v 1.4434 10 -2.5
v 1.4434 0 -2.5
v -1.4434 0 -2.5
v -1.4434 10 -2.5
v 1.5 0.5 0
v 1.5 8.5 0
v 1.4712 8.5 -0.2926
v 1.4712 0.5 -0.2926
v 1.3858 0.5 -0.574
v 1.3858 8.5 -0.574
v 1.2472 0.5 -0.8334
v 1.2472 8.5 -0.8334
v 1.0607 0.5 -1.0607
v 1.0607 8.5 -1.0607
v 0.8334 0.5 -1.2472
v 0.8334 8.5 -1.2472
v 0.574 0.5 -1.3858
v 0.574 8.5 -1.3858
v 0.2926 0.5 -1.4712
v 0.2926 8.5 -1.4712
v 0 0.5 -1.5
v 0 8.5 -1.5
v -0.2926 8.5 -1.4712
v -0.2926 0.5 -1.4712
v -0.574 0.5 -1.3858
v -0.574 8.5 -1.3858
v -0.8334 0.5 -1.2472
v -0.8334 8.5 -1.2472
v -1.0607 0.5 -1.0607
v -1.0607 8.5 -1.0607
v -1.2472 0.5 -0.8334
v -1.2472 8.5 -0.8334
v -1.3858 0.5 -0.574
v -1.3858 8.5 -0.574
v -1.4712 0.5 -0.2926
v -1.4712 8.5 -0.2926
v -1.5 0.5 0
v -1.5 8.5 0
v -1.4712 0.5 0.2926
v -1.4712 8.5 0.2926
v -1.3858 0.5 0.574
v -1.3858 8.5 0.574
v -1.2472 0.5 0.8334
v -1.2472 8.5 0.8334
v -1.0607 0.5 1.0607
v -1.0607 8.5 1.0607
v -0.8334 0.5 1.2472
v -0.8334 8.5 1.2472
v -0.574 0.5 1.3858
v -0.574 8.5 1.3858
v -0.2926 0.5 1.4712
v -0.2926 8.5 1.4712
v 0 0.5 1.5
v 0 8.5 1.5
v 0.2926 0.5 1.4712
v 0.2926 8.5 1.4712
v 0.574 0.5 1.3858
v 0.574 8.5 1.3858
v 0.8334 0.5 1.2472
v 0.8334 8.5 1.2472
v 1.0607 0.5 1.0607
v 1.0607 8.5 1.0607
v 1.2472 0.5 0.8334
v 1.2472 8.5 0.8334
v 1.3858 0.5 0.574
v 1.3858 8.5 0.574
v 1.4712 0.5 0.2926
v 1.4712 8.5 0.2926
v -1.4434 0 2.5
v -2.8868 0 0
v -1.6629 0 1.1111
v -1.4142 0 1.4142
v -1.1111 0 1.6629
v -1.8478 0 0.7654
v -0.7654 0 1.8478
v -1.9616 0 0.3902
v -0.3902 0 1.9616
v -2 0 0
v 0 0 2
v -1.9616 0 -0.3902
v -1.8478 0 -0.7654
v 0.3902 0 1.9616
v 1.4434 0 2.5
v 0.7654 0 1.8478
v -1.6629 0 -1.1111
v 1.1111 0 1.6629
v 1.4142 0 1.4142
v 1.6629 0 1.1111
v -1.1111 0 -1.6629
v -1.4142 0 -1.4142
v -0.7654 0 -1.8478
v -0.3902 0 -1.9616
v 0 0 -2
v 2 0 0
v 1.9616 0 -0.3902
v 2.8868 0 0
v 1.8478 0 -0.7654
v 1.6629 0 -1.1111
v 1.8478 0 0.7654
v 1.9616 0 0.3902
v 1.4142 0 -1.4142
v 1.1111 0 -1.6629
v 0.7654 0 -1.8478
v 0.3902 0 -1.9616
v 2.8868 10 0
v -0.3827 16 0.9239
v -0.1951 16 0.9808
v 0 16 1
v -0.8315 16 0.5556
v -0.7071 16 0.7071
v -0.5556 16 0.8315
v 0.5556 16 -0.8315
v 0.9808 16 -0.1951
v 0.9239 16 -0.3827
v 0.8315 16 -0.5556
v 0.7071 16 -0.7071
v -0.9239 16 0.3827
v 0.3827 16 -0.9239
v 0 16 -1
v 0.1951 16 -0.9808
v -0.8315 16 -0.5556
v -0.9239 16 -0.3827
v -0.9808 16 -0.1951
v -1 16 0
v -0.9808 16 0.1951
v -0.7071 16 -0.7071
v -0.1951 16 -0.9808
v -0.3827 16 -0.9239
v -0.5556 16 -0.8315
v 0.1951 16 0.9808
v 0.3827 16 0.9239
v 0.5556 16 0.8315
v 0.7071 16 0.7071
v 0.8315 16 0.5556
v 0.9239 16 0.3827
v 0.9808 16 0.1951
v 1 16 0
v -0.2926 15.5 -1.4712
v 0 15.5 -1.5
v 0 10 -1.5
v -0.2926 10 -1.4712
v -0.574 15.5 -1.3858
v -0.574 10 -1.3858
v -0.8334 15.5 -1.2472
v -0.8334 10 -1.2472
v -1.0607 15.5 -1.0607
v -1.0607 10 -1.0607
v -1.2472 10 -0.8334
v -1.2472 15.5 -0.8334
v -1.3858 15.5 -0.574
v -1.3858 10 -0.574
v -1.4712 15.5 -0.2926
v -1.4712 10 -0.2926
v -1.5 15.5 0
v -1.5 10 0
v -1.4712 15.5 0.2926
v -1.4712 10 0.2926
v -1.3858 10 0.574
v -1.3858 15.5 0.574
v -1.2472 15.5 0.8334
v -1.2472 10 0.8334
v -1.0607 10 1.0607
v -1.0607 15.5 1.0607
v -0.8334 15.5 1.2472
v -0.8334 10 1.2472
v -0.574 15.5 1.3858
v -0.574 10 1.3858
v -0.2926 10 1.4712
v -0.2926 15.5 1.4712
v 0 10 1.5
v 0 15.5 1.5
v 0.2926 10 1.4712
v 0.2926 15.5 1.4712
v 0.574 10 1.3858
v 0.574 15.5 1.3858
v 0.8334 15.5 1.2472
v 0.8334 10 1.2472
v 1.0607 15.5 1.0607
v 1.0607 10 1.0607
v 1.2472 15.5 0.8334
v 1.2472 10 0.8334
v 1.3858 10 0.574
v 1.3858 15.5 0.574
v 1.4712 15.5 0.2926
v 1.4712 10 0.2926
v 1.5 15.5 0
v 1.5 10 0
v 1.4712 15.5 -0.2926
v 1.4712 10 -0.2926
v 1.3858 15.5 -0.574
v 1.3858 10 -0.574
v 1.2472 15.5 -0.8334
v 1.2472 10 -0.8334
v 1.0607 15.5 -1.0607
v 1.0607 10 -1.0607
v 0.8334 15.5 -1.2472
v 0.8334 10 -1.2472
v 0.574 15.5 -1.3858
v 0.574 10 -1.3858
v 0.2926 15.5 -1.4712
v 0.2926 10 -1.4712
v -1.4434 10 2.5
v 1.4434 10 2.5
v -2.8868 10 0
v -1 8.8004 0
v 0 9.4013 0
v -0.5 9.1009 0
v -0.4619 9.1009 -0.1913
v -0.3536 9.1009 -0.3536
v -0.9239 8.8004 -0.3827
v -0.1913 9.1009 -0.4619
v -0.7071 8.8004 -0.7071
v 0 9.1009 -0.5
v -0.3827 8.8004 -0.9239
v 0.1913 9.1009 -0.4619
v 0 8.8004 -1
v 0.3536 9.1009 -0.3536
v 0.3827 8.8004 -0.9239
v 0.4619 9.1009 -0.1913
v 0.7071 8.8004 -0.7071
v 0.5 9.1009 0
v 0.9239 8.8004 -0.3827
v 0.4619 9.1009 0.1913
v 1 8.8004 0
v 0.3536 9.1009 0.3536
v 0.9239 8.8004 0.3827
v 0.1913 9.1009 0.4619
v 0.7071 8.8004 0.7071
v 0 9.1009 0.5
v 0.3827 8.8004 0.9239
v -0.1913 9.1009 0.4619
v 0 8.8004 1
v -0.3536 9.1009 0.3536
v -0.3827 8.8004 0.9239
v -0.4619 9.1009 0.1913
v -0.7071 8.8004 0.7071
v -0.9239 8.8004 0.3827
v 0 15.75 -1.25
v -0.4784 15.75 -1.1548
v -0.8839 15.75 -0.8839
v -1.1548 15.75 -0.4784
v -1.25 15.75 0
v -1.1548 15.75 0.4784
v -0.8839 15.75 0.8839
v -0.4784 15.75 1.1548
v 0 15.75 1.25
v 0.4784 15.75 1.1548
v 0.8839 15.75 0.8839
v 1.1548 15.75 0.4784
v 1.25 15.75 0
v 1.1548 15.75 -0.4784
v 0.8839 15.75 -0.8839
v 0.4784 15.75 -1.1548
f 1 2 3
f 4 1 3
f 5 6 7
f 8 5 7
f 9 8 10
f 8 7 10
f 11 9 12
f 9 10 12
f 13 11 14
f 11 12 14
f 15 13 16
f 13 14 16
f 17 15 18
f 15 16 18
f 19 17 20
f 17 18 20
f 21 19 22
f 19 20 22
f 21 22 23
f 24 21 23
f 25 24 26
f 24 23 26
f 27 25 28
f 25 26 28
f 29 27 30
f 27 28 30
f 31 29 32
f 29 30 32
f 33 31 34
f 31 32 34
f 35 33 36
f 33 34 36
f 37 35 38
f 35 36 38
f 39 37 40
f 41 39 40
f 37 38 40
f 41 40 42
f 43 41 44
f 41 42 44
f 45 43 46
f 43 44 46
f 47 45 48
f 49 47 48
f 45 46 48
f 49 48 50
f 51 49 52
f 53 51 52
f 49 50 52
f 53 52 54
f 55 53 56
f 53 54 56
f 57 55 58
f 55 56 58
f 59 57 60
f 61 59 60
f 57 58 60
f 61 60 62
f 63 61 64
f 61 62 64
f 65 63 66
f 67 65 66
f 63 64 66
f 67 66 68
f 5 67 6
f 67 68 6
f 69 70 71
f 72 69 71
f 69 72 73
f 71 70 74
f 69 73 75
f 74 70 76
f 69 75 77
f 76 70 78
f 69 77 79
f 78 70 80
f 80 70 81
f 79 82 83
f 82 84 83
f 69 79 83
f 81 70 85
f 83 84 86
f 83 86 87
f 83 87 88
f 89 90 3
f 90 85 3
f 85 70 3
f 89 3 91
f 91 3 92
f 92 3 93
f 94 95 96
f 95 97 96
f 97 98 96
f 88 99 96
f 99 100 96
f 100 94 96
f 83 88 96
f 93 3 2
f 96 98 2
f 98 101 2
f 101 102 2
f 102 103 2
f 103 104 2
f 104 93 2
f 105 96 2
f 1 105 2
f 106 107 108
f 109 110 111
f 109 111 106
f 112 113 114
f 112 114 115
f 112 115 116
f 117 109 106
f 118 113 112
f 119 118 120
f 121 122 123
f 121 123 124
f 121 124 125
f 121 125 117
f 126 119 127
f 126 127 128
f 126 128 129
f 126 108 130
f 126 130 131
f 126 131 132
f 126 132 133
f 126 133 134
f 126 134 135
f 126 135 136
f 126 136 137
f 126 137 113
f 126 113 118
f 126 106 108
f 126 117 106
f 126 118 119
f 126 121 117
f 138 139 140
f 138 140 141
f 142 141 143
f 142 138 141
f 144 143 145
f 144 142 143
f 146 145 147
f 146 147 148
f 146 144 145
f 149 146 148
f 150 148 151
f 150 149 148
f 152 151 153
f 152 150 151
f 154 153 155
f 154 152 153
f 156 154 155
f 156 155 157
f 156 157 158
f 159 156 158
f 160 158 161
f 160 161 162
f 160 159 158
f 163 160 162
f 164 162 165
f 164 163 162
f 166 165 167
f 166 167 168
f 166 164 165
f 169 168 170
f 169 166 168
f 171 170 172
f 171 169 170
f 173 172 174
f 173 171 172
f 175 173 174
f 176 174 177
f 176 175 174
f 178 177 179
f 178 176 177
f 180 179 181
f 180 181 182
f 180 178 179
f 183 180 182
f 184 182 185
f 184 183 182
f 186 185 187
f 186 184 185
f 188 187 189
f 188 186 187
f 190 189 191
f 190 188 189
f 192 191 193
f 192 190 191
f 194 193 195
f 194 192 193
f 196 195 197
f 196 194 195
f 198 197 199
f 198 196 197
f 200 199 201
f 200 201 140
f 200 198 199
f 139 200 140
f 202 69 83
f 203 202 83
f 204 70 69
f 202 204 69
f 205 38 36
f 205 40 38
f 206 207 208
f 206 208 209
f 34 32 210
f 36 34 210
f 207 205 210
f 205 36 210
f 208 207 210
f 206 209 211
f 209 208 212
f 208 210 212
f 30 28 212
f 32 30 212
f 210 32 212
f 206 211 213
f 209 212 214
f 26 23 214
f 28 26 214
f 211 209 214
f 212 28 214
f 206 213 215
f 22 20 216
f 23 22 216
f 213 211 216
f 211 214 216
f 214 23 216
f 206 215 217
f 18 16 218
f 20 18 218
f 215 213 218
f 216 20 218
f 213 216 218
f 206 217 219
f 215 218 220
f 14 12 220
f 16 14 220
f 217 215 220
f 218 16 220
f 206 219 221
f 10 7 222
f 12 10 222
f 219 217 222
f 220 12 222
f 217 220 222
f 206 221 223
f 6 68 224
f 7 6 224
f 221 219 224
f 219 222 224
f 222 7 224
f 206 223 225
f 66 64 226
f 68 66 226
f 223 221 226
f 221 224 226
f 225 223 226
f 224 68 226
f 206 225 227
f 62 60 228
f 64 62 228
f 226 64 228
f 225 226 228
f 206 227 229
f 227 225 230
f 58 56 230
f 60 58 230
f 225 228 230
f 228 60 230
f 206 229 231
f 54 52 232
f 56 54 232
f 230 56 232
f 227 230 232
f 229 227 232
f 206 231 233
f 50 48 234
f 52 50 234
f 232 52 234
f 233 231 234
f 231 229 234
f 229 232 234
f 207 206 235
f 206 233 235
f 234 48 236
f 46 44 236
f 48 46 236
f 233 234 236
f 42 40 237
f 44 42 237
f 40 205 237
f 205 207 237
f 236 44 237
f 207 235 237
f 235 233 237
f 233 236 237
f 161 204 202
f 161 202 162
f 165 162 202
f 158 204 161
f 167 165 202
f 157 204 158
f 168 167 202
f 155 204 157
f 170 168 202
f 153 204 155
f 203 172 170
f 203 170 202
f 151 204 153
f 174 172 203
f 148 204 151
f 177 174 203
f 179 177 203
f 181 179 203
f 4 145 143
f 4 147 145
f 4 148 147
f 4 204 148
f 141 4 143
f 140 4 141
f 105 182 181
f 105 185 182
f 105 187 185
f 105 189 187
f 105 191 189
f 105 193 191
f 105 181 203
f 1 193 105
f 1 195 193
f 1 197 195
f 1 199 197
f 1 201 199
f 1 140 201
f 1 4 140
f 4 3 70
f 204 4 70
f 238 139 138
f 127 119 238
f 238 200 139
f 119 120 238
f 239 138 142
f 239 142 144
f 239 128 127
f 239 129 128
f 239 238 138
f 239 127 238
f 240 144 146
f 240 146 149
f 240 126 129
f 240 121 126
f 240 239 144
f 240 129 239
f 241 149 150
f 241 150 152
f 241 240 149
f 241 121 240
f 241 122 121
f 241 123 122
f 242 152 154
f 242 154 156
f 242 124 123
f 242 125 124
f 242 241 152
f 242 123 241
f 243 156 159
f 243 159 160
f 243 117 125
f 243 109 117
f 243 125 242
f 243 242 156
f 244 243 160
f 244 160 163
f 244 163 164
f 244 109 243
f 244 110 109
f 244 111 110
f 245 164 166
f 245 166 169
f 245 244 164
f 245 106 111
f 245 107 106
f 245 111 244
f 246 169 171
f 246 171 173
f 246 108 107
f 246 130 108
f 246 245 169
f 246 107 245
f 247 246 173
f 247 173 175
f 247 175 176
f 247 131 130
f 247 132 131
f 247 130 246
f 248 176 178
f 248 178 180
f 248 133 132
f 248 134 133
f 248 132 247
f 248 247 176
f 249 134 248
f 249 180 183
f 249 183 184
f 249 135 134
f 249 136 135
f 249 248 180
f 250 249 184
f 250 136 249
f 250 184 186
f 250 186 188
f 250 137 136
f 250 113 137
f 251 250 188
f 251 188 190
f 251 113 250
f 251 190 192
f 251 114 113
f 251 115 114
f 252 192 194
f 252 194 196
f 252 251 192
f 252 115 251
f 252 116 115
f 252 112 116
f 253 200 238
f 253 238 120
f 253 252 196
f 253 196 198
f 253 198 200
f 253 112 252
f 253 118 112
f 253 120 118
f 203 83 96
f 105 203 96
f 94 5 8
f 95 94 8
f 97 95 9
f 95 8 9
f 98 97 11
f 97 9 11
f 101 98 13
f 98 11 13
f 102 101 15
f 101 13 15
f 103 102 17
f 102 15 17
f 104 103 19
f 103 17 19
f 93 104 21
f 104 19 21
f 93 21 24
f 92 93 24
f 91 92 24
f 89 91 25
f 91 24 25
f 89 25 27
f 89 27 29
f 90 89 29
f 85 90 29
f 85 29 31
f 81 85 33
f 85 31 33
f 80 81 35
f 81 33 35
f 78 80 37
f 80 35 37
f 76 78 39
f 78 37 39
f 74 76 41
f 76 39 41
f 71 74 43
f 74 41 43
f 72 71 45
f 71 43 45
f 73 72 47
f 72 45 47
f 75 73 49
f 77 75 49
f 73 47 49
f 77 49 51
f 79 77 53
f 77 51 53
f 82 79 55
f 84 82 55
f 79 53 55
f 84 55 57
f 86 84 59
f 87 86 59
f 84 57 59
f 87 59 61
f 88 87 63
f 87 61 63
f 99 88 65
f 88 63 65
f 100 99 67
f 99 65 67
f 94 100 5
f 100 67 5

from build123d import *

# Parameters (mm, degrees)
EXTRUDE_1_DEPTH           = 10
HOLE_WIZARD_3_0_3_1_D     = 3
HOLE_WIZARD_3_0_3_1_DEPTH = 8.5
HOLE_WIZARD_3_0_3_1_TIP   = 0.901290929
EXTRUDE_START             = 6
SKETCH_4_R                = 1.5
EXTRUDE_2_DEPTH           = 6
CHAMFER_1_SIZE            = 0.5


with BuildPart() as part:
    # Эскиз1 → Бобышка-Вытянуть1 (new body)
    with BuildSketch(Plane(origin=(0, 0, 0), x_dir=(1, 0, 0), z_dir=(0, 1, 0))):
        Polygon((1.443375673, -2.5), (2.886751346, 0), (1.443375673, 2.5), (-1.443375673, 2.5), (-2.886751346, 0), (-1.443375673, -2.5), align=None)
    extrude(amount=EXTRUDE_1_DEPTH)

    # Диаметр отверстия Ø3.0 (3)1
    with Locations(Plane(origin=(0, 0, 0), x_dir=(-1, 0, 0), z_dir=(0, -1, 0))):
        with Locations((0, 0)):
            Hole(HOLE_WIZARD_3_0_3_1_D / 2, depth=HOLE_WIZARD_3_0_3_1_DEPTH)
            with Locations((0, 0, -(HOLE_WIZARD_3_0_3_1_DEPTH + HOLE_WIZARD_3_0_3_1_TIP / 2))):  # 118° drill point
                Cone(0, HOLE_WIZARD_3_0_3_1_D / 2, HOLE_WIZARD_3_0_3_1_TIP, mode=Mode.SUBTRACT)

    # Эскиз4 → Бобышка-Вытянуть2 (add)
    with BuildSketch(Plane(origin=(0, 10, 0), x_dir=(1, 0, 0), z_dir=(0, 1, 0)).offset(EXTRUDE_START)):
        with Locations(Location((0, 0, 0), (0, 0, 90))):
            Circle(SKETCH_4_R)
    extrude(amount=-EXTRUDE_2_DEPTH)

    # Фаска1
    chamfer_1_edges = [part.edges().sort_by_distance(p)[0] for p in [
        (-1.5, 0, 0),
        (0, 16, 1.5),
    ]]
    chamfer(chamfer_1_edges, length=CHAMFER_1_SIZE)


solid = part.part
